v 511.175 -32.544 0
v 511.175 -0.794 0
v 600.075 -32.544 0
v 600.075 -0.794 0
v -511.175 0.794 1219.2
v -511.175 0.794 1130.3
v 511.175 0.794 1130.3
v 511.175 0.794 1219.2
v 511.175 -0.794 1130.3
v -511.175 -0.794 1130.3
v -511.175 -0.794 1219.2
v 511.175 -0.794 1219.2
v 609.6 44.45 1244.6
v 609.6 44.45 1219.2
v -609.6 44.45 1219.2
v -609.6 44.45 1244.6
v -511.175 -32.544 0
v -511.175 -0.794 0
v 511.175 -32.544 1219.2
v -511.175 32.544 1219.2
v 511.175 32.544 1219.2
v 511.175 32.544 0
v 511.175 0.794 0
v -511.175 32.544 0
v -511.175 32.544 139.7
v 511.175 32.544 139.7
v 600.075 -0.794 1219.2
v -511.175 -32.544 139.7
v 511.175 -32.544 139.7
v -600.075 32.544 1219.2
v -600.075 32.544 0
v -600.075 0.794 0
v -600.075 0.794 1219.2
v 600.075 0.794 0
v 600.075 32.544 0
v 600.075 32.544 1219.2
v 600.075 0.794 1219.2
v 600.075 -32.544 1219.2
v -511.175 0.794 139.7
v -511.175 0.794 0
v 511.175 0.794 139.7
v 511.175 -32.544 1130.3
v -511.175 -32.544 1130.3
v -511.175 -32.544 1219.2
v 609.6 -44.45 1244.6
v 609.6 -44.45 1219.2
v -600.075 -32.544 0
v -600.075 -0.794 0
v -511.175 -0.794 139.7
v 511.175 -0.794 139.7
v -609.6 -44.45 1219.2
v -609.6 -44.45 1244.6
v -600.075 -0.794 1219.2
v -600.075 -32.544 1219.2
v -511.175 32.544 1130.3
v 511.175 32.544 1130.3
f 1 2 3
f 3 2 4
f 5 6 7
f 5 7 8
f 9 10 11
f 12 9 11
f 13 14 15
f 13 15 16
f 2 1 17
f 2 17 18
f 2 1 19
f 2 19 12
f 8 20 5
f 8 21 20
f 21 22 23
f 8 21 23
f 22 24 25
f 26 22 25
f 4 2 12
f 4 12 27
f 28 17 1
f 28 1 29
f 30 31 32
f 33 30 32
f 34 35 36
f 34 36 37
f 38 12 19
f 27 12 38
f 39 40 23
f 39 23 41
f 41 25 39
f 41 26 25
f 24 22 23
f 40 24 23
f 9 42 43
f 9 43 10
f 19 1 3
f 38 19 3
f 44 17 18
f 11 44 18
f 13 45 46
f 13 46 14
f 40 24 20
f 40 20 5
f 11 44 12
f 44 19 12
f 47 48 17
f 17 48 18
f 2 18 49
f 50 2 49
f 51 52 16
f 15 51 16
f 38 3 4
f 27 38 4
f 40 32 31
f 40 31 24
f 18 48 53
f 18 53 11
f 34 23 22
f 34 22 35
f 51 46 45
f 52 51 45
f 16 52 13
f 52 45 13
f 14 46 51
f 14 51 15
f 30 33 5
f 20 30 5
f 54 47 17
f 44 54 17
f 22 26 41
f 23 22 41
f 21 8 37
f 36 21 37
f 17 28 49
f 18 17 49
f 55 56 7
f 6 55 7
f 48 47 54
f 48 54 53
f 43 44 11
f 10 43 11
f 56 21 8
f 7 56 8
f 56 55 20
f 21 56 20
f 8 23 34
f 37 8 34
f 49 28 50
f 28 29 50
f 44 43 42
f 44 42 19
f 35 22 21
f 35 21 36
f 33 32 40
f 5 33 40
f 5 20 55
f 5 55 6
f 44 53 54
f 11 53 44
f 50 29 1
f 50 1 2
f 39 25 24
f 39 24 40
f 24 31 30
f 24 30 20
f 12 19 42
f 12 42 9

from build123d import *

# Parameters (mm, degrees)
F0_W          = 88.9
F0_H          = 31.75
F1_DEPTH      = 1219.2
F2_W          = 31.75
F2_H          = 139.7
F2_H_2        = 88.9
F3_DEPTH      = 511.175
F3_DEPTH_BACK = 511.175
F5_W          = 88.9
F5_H          = 25.4
F6_DEPTH      = 609.6


with BuildPart() as f1:
    # F0 (on Top) → F1 (new body)
    with BuildSketch(Plane.XY):
        with Locations((-555.625, -16.66875)):
            Rectangle(F0_W, F0_H)
        with Locations((555.625, -16.66875)):
            Rectangle(F0_W, F0_H)
    extrude(amount=F1_DEPTH)


with BuildPart() as f3:
    # F2 (on Right) → F3 (new body, two sides)
    with BuildSketch(Plane.YZ) as f3_sk:
        with Locations((-16.66875, 69.85)):
            Rectangle(F2_W, F2_H)
        with Locations((-16.66875, 1174.75)):
            Rectangle(F2_W, F2_H_2)
    extrude(amount=F3_DEPTH)
    extrude(f3_sk.sketch, amount=-F3_DEPTH_BACK)


with BuildPart() as f4_1:
    # F4: instance of F1
    add(f1.part.mirror(Plane.XZ))


with BuildPart() as f4_2:
    # F4: instance of F3
    add(f3.part.mirror(Plane.XZ))


with BuildPart() as f6:
    # F5 (on Right) → F6 (new body, symmetric)
    with BuildSketch(Plane.YZ):
        with Locations((0, 1231.9)):
            Rectangle(F5_W, F5_H)
    extrude(amount=F6_DEPTH, both=True)


solid = Compound([f1.part, f3.part, f4_1.part, f4_2.part, f6.part])
